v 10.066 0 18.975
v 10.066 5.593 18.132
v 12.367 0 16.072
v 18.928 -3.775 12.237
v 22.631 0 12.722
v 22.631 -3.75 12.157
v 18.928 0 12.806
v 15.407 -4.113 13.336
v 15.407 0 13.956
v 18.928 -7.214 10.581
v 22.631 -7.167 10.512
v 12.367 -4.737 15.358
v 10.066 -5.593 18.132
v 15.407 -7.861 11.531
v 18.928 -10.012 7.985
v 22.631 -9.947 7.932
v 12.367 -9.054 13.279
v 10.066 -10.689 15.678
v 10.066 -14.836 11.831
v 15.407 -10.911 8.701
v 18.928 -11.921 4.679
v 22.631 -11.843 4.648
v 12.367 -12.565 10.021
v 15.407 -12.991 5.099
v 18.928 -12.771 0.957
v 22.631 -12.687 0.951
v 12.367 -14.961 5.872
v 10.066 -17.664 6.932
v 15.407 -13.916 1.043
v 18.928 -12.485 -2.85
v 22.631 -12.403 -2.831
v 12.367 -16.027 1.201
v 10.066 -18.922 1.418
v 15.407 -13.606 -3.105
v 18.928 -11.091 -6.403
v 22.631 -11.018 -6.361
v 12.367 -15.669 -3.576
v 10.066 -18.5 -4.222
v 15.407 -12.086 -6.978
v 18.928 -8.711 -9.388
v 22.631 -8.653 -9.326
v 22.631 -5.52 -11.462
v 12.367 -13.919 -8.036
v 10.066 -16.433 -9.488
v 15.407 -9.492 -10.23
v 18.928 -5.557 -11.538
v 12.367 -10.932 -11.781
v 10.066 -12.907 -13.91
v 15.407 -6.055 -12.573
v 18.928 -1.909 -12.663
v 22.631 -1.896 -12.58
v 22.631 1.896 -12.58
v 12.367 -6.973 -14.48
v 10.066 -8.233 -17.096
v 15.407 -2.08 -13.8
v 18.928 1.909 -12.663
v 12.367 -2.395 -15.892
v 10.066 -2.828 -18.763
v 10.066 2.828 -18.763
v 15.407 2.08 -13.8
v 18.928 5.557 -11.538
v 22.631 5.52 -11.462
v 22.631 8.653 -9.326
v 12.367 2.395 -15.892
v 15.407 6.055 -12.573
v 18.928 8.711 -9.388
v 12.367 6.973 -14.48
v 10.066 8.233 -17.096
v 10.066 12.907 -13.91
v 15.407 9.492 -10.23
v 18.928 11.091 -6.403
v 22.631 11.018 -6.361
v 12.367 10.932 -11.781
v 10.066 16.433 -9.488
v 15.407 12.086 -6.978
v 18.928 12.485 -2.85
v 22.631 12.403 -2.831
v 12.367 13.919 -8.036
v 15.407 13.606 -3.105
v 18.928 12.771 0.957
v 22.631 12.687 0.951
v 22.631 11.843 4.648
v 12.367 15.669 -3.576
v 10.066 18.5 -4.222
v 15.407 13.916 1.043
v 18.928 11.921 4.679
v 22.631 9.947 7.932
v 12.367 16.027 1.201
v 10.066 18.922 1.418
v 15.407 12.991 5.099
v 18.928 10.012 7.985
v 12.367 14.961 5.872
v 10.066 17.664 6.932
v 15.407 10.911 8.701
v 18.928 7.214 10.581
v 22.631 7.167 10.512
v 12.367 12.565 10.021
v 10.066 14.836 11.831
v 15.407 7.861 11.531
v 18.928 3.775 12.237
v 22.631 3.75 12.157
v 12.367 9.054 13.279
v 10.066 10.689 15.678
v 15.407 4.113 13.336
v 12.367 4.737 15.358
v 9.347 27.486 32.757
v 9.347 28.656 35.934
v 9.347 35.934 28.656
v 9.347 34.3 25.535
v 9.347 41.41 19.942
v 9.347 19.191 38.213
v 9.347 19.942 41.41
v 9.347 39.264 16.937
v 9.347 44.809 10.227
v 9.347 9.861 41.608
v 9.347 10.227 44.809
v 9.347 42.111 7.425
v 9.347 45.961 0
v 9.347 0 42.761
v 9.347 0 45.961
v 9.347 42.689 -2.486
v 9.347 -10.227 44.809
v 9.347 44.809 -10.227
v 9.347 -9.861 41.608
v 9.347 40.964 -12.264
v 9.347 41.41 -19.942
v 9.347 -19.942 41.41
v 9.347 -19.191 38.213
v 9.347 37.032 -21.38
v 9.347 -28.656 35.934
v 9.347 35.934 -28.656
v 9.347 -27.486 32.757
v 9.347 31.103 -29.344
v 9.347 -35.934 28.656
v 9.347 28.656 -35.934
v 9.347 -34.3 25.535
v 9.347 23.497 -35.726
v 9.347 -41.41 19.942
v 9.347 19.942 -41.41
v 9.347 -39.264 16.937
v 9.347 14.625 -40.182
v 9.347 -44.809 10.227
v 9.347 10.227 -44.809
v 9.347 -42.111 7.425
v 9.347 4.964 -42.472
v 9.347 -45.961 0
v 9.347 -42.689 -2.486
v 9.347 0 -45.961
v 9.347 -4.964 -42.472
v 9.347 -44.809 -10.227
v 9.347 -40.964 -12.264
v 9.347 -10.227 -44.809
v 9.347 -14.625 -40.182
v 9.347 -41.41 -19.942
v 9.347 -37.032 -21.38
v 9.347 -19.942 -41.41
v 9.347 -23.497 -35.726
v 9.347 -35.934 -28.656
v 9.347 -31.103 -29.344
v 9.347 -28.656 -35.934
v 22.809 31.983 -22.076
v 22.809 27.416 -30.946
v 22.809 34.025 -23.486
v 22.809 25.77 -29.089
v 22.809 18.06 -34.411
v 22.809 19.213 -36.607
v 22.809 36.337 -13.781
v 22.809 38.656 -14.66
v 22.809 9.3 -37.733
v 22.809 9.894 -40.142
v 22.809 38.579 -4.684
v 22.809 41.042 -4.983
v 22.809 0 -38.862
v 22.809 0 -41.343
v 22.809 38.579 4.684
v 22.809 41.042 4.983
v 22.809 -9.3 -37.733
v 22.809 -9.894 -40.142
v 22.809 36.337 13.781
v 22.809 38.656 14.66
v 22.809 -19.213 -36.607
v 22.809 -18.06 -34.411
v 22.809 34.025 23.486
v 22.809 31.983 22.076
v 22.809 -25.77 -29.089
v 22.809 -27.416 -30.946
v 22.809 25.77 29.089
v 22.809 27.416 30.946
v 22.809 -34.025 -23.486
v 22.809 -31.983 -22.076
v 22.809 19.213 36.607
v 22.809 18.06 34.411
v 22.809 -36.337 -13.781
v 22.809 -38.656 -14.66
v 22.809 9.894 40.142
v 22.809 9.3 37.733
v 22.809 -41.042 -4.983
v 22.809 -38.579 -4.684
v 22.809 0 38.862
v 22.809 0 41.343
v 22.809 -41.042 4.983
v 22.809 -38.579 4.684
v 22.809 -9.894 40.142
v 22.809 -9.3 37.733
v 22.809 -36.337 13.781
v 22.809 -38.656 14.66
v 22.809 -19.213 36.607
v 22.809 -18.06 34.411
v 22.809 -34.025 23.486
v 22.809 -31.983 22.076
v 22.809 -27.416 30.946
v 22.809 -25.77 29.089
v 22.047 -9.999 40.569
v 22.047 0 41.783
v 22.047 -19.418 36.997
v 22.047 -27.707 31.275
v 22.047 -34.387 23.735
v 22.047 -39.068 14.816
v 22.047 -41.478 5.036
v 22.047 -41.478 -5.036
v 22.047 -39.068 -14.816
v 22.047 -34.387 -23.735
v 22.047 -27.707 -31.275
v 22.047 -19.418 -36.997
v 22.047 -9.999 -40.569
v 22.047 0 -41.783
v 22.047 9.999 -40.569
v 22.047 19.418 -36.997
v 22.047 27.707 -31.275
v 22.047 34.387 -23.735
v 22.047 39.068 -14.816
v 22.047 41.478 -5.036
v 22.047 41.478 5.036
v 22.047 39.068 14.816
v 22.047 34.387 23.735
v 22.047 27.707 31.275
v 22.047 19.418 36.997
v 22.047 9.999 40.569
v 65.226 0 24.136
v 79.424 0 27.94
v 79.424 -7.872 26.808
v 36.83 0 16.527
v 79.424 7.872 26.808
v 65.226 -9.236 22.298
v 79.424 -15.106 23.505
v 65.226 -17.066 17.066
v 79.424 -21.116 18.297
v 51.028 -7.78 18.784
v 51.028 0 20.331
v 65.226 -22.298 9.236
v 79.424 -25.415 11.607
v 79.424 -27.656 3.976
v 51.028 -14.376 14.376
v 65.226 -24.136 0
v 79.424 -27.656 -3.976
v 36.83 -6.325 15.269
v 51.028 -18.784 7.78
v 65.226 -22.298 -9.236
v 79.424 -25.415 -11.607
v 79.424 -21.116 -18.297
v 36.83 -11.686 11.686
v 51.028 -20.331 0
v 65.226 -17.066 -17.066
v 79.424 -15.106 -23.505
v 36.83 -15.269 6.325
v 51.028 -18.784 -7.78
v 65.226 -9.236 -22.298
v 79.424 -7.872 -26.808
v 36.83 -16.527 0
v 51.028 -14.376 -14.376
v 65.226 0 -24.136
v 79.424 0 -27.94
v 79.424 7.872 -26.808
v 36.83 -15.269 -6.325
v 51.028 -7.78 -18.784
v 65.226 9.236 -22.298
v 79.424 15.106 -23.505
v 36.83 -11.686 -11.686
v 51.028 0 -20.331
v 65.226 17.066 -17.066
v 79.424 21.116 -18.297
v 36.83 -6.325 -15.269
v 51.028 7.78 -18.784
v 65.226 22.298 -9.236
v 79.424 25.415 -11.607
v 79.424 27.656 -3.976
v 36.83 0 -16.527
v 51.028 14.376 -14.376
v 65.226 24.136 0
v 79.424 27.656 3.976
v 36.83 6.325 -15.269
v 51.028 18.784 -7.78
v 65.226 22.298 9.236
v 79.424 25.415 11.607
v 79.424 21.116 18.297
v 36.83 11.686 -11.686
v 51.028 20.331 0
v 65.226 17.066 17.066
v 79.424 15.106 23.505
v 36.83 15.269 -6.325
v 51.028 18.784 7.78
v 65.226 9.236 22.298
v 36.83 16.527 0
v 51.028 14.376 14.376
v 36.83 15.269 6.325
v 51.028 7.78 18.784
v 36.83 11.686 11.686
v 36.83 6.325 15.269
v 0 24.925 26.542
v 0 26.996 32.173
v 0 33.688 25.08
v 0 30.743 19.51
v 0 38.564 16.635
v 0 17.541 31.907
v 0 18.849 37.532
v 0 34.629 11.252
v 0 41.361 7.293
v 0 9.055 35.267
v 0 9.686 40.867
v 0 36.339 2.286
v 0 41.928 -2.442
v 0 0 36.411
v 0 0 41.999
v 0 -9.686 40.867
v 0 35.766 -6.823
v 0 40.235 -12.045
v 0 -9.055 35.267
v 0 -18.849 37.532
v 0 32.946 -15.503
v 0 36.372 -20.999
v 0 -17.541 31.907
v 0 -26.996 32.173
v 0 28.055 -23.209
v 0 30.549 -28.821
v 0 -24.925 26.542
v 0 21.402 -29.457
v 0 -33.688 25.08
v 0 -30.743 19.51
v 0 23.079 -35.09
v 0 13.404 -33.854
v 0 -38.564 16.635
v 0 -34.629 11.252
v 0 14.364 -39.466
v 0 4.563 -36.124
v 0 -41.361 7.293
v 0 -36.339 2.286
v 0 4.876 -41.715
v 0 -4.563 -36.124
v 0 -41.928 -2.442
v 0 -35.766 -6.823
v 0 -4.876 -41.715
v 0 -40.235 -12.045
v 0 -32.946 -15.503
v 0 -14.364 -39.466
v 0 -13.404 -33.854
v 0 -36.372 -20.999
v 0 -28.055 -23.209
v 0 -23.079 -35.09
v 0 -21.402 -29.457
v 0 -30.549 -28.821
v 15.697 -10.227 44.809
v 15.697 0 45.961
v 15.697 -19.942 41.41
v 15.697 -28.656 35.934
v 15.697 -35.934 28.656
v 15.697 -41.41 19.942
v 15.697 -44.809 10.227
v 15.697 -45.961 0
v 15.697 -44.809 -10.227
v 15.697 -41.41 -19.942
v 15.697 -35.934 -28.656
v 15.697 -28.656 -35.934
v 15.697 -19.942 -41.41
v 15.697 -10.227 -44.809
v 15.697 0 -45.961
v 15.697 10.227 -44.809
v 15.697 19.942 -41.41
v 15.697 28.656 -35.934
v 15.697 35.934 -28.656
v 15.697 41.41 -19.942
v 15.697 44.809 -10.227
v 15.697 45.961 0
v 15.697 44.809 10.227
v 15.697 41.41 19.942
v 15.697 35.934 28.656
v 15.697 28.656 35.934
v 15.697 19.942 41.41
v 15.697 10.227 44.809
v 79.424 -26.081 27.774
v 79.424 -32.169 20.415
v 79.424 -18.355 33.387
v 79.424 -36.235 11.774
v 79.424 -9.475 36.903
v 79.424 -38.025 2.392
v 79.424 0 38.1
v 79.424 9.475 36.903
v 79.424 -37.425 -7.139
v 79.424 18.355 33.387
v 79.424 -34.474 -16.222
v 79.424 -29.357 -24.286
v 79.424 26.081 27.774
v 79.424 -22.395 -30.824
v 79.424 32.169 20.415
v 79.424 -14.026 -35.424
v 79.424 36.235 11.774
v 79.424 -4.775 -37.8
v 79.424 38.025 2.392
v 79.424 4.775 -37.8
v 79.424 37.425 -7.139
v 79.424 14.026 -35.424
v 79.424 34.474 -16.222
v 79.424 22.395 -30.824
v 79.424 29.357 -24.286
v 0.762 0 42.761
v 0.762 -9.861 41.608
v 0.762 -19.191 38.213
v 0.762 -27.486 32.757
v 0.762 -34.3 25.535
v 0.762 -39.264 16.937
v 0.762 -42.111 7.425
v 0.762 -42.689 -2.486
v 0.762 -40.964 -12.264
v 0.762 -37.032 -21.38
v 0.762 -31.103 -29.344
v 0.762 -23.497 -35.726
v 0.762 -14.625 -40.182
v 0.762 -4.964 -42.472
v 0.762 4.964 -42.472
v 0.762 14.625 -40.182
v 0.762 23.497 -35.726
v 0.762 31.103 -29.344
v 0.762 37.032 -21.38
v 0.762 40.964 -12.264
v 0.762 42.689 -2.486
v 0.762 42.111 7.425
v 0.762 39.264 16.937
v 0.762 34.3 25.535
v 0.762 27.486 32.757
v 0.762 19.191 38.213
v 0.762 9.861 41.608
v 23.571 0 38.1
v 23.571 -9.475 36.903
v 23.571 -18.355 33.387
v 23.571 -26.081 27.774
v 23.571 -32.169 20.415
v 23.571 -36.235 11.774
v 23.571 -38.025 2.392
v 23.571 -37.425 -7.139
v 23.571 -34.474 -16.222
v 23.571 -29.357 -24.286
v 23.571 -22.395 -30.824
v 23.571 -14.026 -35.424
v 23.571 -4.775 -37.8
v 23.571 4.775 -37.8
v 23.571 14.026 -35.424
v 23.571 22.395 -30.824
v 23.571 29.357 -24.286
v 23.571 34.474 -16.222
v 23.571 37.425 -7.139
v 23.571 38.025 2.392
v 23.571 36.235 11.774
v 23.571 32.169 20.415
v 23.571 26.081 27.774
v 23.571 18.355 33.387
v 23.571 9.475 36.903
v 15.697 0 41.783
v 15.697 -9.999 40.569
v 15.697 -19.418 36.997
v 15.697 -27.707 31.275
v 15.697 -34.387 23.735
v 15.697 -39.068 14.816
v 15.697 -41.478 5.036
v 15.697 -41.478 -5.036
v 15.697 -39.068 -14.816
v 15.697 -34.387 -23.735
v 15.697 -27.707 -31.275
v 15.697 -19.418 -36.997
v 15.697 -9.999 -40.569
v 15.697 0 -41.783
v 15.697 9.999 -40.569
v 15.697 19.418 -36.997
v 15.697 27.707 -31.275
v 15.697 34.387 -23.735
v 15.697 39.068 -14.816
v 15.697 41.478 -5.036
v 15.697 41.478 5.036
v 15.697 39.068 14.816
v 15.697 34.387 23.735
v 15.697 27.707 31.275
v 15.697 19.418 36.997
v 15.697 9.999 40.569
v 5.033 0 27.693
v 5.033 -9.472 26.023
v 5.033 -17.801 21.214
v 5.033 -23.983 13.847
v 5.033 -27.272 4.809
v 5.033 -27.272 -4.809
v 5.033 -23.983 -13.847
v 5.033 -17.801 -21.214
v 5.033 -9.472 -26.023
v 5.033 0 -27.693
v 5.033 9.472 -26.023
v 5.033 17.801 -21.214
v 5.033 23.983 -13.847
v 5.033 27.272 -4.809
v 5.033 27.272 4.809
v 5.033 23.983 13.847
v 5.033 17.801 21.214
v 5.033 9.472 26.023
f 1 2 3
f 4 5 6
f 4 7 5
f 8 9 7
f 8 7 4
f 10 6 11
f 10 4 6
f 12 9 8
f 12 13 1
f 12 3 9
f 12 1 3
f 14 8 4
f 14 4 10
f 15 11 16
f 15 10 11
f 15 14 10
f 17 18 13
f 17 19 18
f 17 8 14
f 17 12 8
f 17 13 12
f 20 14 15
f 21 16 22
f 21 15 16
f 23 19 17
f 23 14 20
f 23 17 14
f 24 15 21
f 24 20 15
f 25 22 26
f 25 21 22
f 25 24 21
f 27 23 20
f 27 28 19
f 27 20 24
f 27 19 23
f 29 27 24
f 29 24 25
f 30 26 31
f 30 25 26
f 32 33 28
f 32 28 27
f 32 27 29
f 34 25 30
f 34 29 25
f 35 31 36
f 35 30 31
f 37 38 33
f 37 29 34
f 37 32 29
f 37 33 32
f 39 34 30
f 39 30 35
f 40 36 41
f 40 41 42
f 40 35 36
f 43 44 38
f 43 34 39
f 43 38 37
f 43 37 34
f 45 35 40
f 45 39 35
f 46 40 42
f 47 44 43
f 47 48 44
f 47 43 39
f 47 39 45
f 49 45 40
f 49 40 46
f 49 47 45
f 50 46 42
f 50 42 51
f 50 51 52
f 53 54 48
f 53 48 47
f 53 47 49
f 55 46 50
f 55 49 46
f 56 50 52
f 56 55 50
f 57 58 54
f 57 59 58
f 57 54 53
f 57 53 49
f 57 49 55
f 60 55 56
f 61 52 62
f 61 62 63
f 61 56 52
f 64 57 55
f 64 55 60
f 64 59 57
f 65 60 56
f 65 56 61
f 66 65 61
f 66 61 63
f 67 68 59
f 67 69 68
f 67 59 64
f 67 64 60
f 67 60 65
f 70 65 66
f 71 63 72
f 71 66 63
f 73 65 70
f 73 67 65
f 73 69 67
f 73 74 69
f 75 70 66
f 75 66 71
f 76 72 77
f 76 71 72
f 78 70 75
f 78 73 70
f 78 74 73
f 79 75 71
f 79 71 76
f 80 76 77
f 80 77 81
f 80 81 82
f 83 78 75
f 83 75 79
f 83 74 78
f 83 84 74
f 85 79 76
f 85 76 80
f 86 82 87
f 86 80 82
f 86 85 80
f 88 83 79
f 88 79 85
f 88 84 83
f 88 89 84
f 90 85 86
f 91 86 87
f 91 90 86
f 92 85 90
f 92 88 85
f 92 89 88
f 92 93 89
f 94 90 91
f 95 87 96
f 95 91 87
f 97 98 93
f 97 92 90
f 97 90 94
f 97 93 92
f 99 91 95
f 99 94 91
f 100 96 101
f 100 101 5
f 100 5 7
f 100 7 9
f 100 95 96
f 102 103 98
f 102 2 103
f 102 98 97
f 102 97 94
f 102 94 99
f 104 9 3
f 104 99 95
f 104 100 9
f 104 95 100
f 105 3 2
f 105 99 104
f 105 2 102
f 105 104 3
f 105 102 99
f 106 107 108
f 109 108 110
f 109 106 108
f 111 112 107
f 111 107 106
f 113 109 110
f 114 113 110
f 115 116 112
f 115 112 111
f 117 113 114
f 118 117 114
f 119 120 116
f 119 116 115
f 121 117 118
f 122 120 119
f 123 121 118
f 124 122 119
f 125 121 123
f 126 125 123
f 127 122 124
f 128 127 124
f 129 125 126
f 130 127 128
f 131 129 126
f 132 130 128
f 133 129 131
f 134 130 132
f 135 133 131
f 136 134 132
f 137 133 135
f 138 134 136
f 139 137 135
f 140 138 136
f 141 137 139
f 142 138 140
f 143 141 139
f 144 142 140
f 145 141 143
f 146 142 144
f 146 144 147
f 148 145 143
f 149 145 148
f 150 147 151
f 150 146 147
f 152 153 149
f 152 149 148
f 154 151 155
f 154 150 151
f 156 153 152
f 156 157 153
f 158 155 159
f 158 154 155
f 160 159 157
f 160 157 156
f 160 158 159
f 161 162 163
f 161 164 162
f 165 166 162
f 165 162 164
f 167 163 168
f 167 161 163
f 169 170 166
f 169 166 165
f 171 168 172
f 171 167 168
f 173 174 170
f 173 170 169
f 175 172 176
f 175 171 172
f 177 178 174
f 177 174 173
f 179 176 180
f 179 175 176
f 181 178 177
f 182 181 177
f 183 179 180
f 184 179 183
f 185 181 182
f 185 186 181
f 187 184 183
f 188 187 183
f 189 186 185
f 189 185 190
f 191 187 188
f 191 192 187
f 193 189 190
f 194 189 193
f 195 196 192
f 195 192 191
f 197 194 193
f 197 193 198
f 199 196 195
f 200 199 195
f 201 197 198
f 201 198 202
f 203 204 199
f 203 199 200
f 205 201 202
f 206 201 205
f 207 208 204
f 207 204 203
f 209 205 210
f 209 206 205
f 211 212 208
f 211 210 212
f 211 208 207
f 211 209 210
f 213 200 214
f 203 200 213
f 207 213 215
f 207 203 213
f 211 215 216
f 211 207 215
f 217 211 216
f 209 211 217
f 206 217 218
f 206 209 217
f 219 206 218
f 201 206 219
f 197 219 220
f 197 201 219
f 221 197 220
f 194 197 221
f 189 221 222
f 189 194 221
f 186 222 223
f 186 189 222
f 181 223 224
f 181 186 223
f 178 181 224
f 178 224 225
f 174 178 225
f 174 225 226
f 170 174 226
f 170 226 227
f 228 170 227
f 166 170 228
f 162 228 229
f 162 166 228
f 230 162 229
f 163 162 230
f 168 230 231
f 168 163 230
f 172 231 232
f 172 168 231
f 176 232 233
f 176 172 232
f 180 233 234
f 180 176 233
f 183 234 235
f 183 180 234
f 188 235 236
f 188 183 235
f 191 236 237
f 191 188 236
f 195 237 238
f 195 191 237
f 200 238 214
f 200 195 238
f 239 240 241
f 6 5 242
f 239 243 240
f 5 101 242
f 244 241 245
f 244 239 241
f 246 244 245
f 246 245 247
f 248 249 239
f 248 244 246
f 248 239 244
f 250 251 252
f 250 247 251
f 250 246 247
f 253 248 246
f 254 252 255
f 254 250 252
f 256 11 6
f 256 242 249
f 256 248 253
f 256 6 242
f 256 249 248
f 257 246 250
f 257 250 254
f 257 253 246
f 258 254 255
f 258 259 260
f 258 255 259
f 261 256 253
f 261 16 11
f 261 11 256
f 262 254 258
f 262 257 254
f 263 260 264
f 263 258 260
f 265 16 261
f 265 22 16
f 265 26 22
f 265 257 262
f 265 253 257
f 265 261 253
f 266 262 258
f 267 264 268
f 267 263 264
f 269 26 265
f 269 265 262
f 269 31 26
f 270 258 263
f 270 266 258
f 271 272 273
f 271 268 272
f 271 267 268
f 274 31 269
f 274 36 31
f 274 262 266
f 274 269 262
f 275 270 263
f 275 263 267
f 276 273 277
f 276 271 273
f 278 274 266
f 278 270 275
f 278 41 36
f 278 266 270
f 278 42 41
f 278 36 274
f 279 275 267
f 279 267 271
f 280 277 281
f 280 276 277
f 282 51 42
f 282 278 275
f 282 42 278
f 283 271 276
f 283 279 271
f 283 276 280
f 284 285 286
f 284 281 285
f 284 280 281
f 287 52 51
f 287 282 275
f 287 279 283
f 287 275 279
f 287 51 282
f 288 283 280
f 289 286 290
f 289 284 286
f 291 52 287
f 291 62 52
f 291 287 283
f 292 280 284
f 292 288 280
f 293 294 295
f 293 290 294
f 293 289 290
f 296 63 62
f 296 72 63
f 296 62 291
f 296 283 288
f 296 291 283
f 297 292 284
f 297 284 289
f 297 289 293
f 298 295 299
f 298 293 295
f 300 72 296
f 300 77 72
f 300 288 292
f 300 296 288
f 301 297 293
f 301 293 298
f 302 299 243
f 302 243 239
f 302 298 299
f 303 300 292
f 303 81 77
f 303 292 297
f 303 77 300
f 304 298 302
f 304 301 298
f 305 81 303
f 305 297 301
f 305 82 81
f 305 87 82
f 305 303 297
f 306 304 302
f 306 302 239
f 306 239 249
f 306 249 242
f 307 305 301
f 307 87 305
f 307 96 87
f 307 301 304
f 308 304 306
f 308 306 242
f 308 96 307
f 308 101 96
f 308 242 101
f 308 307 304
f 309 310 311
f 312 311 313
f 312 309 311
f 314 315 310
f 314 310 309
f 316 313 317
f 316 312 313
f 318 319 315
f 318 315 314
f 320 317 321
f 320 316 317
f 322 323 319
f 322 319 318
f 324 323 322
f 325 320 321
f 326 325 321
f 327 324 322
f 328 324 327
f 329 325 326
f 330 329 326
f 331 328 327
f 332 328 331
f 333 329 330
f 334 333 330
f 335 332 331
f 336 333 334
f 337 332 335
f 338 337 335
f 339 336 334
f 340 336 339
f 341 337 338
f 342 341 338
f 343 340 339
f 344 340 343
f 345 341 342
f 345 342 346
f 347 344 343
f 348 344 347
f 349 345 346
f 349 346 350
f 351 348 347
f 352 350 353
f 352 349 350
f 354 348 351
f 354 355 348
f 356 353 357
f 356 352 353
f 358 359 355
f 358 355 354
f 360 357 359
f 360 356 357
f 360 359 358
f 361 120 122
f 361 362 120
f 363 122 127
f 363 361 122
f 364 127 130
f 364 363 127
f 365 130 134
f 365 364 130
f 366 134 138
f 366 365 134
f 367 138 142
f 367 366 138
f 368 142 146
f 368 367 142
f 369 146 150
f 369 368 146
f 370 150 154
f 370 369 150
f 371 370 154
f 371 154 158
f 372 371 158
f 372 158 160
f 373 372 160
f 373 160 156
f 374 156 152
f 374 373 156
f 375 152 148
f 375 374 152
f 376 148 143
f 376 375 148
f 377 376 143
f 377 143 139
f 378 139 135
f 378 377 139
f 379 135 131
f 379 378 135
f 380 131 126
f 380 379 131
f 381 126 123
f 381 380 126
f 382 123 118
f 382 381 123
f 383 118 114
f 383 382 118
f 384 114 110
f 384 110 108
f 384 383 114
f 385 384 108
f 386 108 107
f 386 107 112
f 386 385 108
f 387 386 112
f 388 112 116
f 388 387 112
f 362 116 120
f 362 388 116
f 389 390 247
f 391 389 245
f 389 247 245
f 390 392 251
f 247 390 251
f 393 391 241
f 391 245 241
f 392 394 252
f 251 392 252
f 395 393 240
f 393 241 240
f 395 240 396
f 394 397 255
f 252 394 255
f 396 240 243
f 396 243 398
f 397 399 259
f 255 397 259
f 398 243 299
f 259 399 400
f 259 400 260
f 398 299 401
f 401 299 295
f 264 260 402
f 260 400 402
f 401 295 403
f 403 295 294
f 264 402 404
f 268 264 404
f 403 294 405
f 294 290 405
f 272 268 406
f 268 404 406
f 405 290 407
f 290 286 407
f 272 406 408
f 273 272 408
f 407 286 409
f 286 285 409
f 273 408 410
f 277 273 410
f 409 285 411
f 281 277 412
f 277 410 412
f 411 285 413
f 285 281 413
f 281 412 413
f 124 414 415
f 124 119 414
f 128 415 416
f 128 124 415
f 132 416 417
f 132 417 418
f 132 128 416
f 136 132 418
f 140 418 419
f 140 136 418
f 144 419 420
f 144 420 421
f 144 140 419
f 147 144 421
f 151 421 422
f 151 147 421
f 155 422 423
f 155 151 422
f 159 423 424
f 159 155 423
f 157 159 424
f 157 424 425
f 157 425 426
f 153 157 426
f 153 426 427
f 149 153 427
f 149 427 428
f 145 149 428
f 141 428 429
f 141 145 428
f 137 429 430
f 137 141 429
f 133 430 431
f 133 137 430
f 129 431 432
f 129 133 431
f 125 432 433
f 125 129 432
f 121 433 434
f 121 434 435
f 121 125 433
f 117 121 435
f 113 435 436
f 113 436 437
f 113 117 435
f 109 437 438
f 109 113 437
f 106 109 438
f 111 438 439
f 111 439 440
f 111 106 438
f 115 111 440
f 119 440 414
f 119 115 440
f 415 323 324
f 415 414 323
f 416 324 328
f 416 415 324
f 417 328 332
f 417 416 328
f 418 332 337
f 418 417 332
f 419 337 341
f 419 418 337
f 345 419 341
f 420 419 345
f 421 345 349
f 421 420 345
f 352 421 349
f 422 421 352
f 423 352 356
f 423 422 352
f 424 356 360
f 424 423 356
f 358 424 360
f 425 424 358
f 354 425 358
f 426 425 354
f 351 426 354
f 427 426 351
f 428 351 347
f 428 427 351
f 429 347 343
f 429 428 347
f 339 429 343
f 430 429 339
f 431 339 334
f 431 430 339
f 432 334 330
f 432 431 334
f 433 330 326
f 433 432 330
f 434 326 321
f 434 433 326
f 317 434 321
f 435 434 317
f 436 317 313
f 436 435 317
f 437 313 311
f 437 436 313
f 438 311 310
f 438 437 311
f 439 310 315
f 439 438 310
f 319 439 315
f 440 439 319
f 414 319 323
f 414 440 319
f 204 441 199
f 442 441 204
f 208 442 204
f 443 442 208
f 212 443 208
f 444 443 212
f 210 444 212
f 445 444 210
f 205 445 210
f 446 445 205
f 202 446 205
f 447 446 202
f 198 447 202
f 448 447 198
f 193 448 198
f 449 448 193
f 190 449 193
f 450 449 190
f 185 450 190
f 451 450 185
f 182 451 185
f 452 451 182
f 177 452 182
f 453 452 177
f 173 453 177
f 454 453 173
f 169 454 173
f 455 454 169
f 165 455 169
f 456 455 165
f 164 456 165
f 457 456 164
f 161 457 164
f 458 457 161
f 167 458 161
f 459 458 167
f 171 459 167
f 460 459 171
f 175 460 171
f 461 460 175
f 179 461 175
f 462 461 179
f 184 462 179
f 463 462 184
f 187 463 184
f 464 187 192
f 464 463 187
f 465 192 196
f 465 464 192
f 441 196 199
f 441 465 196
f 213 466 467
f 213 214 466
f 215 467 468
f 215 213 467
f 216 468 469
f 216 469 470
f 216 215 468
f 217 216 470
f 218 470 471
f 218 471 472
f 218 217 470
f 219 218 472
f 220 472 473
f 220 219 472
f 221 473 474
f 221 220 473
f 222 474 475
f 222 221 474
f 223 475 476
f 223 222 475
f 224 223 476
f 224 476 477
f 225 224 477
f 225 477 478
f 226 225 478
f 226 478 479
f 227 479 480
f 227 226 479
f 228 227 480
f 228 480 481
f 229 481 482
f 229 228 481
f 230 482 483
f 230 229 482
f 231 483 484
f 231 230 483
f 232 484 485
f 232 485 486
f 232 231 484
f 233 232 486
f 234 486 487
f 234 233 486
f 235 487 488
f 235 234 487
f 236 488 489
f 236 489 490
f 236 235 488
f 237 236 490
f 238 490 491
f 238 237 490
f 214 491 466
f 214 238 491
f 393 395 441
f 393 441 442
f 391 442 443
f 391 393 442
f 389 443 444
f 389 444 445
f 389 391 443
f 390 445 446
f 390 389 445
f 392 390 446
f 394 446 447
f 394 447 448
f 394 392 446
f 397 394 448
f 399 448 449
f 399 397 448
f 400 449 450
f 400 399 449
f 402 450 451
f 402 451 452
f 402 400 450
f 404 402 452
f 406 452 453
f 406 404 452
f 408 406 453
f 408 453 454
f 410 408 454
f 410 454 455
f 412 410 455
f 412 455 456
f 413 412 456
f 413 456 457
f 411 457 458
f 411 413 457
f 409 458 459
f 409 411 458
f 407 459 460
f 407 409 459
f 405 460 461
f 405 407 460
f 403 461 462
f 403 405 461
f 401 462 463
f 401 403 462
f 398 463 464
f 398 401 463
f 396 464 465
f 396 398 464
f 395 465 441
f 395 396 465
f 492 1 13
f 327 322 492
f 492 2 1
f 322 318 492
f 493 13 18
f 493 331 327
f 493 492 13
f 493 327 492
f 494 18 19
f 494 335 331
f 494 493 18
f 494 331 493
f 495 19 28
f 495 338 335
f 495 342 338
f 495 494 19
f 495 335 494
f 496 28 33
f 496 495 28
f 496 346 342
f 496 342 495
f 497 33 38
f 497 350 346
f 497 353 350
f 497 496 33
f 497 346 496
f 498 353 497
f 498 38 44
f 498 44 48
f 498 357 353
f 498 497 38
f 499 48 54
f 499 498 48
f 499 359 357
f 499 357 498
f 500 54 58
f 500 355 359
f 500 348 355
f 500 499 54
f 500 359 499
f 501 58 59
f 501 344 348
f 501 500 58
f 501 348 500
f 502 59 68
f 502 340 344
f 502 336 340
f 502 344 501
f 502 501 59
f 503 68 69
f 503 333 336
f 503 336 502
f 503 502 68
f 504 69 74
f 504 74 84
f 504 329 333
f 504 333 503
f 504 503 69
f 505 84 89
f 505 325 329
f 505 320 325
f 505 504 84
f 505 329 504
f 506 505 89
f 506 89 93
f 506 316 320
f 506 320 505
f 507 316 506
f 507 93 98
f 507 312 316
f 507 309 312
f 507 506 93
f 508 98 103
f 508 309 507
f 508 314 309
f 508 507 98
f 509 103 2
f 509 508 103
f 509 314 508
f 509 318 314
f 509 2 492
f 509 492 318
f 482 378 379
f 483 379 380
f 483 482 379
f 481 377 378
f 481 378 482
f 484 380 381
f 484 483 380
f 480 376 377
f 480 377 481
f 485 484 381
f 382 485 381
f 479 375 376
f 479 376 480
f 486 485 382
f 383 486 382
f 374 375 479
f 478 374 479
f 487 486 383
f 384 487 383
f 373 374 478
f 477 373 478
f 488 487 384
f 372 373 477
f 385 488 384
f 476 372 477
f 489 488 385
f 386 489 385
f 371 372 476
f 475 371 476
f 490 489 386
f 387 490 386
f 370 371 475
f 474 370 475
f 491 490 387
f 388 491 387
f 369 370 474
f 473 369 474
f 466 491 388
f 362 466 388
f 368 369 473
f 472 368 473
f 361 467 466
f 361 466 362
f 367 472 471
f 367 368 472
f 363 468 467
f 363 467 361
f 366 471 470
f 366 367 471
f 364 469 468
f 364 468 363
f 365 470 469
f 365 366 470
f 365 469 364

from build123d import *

# Parameters (mm, degrees)
CUT_EXTRUDE1_DEPTH      = 124.385507346
CUT_EXTRUDE1_DEPTH_BACK = 124.385507346
SKETCH2_W               = 25.452213303
SKETCH2_H               = 76.2


with BuildPart() as part:
    # Sketch1 → Revolve1 (revolve)
    with BuildSketch(Plane.XY, mode=Mode.PRIVATE) as revolve1_sk:
        with BuildLine():
            Line((0, 36.4109), (0, 41.9989))
            Line((0, 41.9989), (0.762, 42.7609))
            Line((0.762, 42.7609), (9.3472, 42.7609))
            Line((9.3472, 42.7609), (9.3472, 45.9613))
            Line((9.3472, 45.9613), (15.6972, 45.9613))
            Line((15.6972, 45.9613), (15.6972, 41.783))
            Line((15.6972, 41.783), (22.0472, 41.783))
            Line((22.0472, 41.783), (22.8092, 41.343059095))
            Line((22.8092, 41.343059095), (22.8092, 38.862))
            Line((22.8092, 38.862), (23.5712, 38.1))
            Line((23.5712, 38.1), (104.1146, 38.1))
            Line((104.1146, 38.1), (104.8766, 37.338))
            Line((104.8766, 37.338), (104.8766, 34.7599))
            Line((104.8766, 34.7599), (22.6314, 12.722365079))
            ThreePointArc((22.6314, 12.722365079), (15.406658957, 13.955510804), (10.066398525, 18.975386305))
            Line((10.066398525, 18.975386305), (0, 36.4109))
        make_face()
    revolve(revolve1_sk.sketch.rotate(Axis((0, 0, 0), (1, 0, 0)), 90), axis=Axis((0, 0, 0), (1, 0, 0)))

    # Sketch2 → Cut-Extrude1 (cut, two sides: drawn at the far end of the back side and taken through both)
    with BuildSketch(Plane.XY.offset(-CUT_EXTRUDE1_DEPTH_BACK)):
        with Locations((92.150493349, 0)):
            Rectangle(SKETCH2_W, SKETCH2_H)
    extrude(amount=CUT_EXTRUDE1_DEPTH + CUT_EXTRUDE1_DEPTH_BACK, mode=Mode.SUBTRACT)


solid = part.part
